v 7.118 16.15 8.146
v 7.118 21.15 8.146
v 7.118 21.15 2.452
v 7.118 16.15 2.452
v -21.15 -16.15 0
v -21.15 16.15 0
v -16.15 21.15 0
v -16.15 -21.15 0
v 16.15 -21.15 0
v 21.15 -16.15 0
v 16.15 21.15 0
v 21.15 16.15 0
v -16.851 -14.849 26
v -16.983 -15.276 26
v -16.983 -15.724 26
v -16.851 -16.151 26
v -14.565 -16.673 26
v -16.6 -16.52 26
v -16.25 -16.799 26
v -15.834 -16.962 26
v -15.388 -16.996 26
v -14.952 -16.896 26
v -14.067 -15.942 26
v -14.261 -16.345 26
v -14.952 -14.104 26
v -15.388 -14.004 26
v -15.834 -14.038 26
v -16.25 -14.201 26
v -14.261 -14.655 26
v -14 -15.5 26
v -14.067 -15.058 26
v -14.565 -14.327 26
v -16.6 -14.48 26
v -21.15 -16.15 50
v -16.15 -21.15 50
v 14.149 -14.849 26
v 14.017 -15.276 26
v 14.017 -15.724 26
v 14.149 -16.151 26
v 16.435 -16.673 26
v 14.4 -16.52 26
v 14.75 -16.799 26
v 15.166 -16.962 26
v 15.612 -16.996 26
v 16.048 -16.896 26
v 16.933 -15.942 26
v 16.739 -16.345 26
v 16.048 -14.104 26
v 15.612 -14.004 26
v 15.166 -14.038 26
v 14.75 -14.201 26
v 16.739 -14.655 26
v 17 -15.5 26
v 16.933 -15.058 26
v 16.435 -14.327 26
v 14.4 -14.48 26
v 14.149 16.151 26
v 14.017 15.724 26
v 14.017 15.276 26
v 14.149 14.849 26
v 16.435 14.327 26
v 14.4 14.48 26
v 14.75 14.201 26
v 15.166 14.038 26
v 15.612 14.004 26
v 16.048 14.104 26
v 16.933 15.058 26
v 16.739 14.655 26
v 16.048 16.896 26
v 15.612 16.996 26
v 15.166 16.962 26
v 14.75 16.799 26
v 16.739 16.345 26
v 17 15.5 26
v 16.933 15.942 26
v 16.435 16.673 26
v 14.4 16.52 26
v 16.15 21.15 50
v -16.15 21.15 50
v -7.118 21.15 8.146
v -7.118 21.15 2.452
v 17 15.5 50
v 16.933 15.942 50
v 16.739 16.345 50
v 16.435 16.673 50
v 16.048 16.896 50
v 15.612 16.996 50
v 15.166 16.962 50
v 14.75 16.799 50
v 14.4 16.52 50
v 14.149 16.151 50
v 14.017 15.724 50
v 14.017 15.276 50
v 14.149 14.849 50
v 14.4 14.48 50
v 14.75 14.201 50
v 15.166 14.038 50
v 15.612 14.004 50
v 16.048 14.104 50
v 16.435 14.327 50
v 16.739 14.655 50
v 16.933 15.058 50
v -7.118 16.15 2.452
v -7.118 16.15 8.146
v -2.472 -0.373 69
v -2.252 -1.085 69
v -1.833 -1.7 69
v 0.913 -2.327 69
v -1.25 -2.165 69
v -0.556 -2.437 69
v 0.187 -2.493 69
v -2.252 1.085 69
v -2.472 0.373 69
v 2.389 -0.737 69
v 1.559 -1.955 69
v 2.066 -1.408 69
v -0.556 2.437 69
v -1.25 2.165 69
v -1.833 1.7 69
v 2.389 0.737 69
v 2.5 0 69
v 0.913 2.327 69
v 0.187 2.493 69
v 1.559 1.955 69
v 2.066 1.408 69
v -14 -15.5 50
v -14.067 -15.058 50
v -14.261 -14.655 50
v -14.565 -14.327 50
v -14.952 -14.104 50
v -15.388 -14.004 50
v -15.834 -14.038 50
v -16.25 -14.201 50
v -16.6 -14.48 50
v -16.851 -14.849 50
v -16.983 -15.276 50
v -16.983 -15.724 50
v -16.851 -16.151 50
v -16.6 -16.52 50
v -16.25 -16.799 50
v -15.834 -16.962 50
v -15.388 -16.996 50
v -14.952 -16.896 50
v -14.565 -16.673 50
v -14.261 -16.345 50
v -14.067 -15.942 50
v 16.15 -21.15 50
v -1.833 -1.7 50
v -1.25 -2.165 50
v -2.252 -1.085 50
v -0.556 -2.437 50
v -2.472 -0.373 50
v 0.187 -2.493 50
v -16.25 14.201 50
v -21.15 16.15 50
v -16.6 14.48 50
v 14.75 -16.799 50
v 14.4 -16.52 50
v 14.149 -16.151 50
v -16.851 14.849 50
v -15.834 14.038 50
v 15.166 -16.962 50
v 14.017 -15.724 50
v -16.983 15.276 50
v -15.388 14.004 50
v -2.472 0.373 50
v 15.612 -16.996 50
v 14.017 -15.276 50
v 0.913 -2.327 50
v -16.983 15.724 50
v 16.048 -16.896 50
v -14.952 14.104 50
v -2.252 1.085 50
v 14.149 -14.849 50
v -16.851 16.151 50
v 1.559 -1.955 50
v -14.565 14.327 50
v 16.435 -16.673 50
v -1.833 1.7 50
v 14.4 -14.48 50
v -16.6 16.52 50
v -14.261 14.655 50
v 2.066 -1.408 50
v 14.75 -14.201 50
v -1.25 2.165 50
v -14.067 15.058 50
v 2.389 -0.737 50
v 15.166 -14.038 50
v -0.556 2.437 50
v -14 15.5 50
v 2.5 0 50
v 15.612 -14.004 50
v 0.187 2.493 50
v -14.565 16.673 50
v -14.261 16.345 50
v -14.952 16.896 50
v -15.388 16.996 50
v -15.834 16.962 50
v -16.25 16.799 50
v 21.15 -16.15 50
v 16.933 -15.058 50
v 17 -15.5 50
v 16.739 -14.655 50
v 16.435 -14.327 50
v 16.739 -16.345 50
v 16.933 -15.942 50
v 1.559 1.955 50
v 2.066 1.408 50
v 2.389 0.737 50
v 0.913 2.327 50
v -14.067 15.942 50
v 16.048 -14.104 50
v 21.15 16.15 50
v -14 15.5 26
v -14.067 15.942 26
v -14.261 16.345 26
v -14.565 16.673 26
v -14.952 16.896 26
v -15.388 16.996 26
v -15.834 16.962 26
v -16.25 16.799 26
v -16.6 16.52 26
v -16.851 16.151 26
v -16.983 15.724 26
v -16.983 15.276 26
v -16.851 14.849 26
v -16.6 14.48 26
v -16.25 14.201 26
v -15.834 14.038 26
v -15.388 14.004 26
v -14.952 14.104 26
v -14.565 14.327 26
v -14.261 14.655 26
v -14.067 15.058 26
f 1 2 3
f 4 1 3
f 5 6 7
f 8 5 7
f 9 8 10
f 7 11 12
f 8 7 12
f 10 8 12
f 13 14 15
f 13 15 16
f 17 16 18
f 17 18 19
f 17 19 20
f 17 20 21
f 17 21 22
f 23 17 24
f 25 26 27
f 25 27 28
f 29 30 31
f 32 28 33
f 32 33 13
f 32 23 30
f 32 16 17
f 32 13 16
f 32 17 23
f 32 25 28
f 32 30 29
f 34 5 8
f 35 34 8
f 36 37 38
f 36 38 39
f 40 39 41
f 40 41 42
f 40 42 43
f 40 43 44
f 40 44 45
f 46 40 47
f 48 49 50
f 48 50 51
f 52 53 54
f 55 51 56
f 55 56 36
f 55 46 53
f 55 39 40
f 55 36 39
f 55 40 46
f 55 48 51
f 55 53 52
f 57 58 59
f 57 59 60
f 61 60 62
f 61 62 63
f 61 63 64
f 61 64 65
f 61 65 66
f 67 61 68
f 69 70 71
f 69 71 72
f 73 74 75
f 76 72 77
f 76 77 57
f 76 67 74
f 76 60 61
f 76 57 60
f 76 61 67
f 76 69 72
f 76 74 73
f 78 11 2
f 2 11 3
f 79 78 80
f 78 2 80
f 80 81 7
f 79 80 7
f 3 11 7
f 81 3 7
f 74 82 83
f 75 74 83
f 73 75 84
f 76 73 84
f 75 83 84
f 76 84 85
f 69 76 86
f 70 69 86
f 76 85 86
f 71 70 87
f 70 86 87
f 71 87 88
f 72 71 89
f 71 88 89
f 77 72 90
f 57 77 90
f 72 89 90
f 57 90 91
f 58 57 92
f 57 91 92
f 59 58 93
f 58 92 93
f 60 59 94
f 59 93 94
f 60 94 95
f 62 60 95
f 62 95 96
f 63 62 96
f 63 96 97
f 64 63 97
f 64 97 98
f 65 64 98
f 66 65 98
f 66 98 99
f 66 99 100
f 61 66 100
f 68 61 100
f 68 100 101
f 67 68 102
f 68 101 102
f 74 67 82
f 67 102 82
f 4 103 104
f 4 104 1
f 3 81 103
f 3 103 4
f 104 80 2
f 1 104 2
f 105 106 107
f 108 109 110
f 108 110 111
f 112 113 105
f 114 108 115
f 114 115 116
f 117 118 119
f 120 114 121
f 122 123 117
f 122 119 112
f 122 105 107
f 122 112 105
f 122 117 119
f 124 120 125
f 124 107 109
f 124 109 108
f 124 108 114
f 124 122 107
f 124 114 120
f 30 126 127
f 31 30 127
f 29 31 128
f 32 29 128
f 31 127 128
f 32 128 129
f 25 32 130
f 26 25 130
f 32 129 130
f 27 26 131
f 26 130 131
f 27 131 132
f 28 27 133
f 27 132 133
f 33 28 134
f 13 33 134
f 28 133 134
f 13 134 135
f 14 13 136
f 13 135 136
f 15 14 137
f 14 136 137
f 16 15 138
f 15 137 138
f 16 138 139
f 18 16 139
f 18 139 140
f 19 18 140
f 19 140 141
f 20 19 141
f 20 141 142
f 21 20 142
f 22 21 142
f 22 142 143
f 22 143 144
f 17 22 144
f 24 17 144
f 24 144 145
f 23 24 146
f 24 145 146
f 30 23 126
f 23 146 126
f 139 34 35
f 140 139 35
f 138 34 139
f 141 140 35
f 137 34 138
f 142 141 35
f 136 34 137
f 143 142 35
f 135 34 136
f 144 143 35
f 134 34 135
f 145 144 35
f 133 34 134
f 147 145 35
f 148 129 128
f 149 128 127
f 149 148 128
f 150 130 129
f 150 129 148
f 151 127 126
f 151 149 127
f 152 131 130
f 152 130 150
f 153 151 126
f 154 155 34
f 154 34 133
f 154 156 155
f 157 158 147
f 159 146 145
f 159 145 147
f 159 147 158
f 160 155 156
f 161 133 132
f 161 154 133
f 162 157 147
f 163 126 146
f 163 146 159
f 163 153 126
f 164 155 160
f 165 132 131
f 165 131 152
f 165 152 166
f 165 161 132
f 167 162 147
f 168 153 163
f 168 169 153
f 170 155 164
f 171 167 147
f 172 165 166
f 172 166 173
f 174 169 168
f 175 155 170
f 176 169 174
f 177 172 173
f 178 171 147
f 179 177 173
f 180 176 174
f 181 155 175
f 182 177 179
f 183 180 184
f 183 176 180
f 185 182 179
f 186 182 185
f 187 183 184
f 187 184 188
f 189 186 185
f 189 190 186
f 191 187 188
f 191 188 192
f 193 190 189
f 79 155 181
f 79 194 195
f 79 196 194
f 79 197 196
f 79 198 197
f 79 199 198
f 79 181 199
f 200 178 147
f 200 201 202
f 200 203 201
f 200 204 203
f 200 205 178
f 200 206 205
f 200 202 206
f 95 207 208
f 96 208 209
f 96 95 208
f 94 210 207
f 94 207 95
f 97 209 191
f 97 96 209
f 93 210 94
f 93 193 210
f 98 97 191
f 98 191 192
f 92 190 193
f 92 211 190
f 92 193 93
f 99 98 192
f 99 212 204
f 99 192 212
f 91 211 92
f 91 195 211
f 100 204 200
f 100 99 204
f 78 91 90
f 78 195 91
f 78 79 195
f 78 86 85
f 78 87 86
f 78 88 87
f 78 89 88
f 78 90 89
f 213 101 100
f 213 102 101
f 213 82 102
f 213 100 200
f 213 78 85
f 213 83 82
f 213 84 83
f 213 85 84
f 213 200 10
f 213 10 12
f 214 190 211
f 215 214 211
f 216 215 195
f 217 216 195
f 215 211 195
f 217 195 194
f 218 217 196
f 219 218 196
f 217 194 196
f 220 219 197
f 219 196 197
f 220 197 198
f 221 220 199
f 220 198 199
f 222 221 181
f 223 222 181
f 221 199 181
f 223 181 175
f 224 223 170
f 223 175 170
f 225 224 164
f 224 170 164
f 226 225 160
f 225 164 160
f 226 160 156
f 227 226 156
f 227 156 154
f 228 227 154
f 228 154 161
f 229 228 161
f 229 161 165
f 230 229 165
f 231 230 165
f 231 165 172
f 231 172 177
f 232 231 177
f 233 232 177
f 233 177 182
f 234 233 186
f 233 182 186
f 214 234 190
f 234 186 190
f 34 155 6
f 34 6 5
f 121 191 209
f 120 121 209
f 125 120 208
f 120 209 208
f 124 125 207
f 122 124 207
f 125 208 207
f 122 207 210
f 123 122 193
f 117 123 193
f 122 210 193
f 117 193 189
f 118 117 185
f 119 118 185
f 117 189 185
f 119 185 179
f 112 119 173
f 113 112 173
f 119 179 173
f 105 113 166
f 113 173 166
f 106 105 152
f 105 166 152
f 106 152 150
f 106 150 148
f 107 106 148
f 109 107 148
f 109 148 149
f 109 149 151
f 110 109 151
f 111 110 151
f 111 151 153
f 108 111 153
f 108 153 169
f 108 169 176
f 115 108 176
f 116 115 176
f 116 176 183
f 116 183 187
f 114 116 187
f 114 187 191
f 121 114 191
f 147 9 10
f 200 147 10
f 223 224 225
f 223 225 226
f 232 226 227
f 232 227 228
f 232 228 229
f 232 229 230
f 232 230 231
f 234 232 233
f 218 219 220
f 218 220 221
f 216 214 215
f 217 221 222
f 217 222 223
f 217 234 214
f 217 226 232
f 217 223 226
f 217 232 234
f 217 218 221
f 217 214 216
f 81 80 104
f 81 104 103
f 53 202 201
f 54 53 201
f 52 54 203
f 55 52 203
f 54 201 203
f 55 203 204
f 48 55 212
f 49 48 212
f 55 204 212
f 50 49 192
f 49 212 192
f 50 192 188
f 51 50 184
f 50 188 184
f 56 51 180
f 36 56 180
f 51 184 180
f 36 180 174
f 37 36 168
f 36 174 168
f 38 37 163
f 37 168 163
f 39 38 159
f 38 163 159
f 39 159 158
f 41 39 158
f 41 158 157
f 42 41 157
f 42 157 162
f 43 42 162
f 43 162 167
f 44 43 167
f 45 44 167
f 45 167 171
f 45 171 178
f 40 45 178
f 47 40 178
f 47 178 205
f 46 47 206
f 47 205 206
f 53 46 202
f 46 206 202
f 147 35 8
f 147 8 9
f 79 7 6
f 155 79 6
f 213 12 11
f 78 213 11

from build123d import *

# Parameters (mm, degrees)
BOSS_EXTRUDE1_DEPTH = 50
SKETCH2_R           = 2.5
BOSS_EXTRUDE2_DEPTH = 24
SKETCH3_R           = 1.5
CUT_EXTRUDE1_DEPTH  = 24
SKETCH4_W           = 14.23576085
SKETCH4_H           = 5.694304341
CUT_EXTRUDE2_DEPTH  = 5
SKETCH6_R           = 2.5
CUT_EXTRUDE3_DEPTH  = 5


with BuildPart() as part:
    # Sketch1 → Boss-Extrude1 (new body)
    with BuildSketch(Plane.XY):
        Polygon((-16.15, 21.15), (-21.15, 16.15), (-21.15, -16.15), (-16.15, -21.15), (16.15, -21.15), (21.15, -16.15), (21.15, 16.15), (16.15, 21.15), align=None)
    extrude(amount=BOSS_EXTRUDE1_DEPTH)

    # Sketch2 → Boss-Extrude2 (add)
    with BuildSketch(Plane.XY.offset(50)):
        Circle(SKETCH2_R)
    extrude(amount=BOSS_EXTRUDE2_DEPTH)

    # Sketch3 → Cut-Extrude1 (cut)
    with BuildSketch(Plane.XY.offset(50)):
        with Locations((-15.5, 15.5)):
            Circle(SKETCH3_R)
        with Locations((-15.5, -15.5)):
            Circle(SKETCH3_R)
        with Locations((15.5, -15.5)):
            Circle(SKETCH3_R)
        with Locations((15.5, 15.5)):
            Circle(SKETCH3_R)
    extrude(amount=-CUT_EXTRUDE1_DEPTH, mode=Mode.SUBTRACT)

    # Sketch4 → Cut-Extrude2 (cut)
    with BuildSketch(Plane(origin=(0, 21.15, 0), x_dir=(1, 0, 0), z_dir=(0, 1, 0))):
        with Locations((0, -5.299206554)):
            Rectangle(SKETCH4_W, SKETCH4_H)
    extrude(amount=-CUT_EXTRUDE2_DEPTH, mode=Mode.SUBTRACT)

    # Sketch6 → Cut-Extrude3 (cut)
    with BuildSketch(Plane.XY.offset(74)):
        Circle(SKETCH6_R)
    extrude(amount=-CUT_EXTRUDE3_DEPTH, mode=Mode.SUBTRACT)


solid = part.part
